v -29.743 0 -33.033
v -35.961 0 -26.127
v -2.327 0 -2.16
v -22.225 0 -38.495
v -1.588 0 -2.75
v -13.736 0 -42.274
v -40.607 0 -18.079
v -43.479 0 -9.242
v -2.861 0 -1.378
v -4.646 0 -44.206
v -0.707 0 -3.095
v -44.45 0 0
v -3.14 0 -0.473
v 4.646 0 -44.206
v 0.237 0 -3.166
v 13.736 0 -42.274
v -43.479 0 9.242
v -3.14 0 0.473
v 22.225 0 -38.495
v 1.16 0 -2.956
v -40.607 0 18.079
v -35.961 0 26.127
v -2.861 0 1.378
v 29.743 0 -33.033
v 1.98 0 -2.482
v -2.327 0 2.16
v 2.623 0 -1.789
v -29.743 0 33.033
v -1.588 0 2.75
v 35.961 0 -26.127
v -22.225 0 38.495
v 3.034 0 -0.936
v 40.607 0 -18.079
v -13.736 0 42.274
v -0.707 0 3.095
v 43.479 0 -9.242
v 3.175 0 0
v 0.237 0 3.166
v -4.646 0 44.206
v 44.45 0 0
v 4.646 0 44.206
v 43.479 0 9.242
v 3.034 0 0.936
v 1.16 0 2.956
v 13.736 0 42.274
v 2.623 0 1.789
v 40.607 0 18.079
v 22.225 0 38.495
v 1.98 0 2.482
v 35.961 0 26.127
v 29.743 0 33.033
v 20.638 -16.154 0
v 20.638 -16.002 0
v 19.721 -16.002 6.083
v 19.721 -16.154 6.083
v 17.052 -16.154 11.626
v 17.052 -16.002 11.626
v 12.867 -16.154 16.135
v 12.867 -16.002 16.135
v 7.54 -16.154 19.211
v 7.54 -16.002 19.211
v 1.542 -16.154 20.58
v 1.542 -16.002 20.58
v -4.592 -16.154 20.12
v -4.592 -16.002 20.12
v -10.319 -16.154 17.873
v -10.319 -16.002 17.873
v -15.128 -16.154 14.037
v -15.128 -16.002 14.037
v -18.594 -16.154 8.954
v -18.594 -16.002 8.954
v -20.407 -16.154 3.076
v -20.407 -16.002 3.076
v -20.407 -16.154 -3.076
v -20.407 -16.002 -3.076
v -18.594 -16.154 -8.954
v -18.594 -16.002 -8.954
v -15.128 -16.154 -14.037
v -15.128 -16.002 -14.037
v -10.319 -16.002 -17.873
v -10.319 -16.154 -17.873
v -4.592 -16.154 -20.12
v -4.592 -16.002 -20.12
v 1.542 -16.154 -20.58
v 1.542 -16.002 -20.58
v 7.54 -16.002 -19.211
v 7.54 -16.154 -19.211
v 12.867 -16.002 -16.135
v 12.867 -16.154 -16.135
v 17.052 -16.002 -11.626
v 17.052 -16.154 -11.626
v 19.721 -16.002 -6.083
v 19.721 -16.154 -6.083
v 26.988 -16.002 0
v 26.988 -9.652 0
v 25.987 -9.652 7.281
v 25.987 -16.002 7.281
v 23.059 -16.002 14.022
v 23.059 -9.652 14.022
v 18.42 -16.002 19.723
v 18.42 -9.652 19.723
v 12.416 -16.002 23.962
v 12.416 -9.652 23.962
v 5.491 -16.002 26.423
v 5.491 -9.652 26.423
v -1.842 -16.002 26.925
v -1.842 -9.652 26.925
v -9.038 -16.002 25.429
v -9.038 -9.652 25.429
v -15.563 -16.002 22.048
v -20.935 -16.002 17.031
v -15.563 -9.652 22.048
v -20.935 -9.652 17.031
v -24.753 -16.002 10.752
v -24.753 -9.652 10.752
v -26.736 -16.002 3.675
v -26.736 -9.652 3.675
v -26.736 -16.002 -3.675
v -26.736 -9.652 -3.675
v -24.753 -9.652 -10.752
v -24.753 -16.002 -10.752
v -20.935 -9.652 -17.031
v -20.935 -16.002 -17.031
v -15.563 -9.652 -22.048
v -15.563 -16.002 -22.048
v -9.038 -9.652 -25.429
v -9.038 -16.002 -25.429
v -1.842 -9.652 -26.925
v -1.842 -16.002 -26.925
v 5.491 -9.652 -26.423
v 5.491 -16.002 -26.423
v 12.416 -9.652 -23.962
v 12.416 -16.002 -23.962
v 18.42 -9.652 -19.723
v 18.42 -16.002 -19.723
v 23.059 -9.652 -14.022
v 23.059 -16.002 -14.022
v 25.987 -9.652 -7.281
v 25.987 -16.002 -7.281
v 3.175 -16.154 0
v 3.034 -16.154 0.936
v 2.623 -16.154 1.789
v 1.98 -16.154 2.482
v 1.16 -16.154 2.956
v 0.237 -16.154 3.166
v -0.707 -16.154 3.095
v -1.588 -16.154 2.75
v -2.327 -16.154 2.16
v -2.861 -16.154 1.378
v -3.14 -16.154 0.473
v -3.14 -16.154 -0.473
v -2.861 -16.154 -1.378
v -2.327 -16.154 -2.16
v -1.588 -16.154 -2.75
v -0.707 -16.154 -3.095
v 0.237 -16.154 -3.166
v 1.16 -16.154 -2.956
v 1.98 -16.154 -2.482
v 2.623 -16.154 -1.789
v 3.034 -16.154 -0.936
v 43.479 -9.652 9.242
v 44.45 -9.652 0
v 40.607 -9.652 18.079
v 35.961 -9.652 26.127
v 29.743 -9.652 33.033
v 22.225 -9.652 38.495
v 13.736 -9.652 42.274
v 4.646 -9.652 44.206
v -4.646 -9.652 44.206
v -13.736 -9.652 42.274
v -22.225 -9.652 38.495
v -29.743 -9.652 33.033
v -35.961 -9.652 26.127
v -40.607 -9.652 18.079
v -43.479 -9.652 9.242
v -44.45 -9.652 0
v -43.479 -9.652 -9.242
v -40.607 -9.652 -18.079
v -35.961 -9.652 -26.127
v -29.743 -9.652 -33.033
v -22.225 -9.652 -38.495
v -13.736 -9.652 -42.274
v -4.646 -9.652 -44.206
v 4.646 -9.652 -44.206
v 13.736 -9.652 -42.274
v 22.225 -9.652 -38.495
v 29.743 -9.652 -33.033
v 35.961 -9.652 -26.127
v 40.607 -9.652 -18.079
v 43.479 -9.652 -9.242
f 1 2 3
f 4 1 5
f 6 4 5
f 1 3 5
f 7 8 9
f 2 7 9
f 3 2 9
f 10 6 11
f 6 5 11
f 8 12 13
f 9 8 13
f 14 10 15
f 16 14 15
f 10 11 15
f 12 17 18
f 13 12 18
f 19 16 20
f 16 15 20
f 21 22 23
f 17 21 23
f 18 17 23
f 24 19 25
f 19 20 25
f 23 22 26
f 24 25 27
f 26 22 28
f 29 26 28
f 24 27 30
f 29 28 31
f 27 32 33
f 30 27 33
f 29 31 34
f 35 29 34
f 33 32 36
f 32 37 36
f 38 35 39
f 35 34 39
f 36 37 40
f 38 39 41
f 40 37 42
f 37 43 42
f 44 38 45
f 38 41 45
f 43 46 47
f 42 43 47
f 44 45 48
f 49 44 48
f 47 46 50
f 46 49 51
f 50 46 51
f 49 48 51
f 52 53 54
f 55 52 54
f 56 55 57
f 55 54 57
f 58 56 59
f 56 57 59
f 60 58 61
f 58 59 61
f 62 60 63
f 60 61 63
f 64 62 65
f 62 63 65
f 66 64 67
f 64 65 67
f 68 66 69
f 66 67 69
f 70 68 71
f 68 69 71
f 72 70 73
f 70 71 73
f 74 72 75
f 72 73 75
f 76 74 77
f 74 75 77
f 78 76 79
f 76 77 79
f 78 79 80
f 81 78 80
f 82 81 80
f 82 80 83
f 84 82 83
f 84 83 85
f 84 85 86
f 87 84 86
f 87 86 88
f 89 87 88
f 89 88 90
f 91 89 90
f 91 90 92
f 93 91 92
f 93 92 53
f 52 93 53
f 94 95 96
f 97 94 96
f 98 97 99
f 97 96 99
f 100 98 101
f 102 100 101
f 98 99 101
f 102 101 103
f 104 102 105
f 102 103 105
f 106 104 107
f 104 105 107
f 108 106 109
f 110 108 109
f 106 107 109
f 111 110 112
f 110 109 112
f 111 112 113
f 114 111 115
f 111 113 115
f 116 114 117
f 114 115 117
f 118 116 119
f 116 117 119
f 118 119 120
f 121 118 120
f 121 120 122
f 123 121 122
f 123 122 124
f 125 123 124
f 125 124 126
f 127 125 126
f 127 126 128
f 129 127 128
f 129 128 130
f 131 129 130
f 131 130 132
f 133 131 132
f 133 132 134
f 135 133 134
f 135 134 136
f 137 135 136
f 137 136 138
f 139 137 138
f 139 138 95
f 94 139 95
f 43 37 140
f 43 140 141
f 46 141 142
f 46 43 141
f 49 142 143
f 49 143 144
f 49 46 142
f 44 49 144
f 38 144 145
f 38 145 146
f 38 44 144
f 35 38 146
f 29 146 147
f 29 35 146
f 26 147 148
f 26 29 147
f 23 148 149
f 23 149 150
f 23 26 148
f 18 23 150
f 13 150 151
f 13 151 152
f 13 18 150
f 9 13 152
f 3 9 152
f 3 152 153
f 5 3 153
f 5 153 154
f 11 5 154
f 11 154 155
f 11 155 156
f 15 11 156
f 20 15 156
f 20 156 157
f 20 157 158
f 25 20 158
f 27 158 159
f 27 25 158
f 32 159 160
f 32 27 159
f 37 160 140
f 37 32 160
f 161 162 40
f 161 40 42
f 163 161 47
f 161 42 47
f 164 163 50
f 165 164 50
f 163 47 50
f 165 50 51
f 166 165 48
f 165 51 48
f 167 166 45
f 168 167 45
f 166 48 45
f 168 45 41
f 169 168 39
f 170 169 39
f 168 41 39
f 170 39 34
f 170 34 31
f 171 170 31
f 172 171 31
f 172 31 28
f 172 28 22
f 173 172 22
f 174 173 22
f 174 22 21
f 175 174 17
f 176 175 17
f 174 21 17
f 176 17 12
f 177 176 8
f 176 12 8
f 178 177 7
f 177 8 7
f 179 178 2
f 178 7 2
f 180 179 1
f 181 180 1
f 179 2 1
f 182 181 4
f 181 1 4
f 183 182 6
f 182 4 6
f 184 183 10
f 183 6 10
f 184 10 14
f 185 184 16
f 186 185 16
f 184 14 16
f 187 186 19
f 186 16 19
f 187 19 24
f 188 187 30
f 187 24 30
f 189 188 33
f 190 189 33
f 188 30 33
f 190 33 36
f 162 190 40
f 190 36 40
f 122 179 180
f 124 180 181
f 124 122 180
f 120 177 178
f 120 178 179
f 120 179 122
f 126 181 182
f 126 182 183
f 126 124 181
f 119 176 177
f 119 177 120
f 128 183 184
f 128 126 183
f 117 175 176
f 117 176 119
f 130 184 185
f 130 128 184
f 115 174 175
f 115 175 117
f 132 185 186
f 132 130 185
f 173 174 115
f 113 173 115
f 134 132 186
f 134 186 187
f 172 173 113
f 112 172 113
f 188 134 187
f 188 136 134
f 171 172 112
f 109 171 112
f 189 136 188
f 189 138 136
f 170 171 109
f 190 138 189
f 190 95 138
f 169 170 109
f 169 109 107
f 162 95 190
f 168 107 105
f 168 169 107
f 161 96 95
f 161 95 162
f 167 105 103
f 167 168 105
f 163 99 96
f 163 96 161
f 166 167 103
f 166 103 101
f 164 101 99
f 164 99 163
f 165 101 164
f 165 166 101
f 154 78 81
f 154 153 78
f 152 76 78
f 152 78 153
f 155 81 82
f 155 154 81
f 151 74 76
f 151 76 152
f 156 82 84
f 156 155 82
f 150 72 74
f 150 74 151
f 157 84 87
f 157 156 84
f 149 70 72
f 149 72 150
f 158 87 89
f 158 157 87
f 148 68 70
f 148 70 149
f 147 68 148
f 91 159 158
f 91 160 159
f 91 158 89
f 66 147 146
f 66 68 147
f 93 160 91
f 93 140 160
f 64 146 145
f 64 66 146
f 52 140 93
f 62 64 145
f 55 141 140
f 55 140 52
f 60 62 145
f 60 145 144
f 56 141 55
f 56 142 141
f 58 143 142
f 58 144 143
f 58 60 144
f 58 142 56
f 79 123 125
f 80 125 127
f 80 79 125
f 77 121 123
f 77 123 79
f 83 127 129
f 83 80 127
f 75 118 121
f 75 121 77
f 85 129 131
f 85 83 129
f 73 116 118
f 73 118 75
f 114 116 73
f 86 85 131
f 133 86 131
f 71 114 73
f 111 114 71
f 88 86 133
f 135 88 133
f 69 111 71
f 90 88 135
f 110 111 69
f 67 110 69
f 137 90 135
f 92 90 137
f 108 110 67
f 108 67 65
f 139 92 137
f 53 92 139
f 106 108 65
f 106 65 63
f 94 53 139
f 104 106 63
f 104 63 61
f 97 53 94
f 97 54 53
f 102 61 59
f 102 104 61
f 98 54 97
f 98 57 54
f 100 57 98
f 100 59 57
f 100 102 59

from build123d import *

# Parameters (mm, degrees)
F0_R     = 20.6375
F0_R_2   = 3.175
F1_DEPTH = 16.1544
F0_R_3   = 26.9875
F2_DEPTH = 16.002
F0_R_4   = 44.45
F3_DEPTH = 9.652


with BuildPart() as f1:
    # F0 (on Front) → F1 (new body)
    with BuildSketch(Plane.XZ):
        Circle(F0_R)
        Circle(F0_R_2, mode=Mode.SUBTRACT)
    extrude(amount=F1_DEPTH)

    # F0 (on Front) → F2 (join)
    with BuildSketch(Plane.XZ):
        Circle(F0_R_3)
        Circle(F0_R, mode=Mode.SUBTRACT)
    extrude(amount=F2_DEPTH)

    # F0 (on Front) → F3 (join)
    with BuildSketch(Plane.XZ):
        Circle(F0_R_4)
        Circle(F0_R_3, mode=Mode.SUBTRACT)
    extrude(amount=F3_DEPTH)


solid = f1.part
